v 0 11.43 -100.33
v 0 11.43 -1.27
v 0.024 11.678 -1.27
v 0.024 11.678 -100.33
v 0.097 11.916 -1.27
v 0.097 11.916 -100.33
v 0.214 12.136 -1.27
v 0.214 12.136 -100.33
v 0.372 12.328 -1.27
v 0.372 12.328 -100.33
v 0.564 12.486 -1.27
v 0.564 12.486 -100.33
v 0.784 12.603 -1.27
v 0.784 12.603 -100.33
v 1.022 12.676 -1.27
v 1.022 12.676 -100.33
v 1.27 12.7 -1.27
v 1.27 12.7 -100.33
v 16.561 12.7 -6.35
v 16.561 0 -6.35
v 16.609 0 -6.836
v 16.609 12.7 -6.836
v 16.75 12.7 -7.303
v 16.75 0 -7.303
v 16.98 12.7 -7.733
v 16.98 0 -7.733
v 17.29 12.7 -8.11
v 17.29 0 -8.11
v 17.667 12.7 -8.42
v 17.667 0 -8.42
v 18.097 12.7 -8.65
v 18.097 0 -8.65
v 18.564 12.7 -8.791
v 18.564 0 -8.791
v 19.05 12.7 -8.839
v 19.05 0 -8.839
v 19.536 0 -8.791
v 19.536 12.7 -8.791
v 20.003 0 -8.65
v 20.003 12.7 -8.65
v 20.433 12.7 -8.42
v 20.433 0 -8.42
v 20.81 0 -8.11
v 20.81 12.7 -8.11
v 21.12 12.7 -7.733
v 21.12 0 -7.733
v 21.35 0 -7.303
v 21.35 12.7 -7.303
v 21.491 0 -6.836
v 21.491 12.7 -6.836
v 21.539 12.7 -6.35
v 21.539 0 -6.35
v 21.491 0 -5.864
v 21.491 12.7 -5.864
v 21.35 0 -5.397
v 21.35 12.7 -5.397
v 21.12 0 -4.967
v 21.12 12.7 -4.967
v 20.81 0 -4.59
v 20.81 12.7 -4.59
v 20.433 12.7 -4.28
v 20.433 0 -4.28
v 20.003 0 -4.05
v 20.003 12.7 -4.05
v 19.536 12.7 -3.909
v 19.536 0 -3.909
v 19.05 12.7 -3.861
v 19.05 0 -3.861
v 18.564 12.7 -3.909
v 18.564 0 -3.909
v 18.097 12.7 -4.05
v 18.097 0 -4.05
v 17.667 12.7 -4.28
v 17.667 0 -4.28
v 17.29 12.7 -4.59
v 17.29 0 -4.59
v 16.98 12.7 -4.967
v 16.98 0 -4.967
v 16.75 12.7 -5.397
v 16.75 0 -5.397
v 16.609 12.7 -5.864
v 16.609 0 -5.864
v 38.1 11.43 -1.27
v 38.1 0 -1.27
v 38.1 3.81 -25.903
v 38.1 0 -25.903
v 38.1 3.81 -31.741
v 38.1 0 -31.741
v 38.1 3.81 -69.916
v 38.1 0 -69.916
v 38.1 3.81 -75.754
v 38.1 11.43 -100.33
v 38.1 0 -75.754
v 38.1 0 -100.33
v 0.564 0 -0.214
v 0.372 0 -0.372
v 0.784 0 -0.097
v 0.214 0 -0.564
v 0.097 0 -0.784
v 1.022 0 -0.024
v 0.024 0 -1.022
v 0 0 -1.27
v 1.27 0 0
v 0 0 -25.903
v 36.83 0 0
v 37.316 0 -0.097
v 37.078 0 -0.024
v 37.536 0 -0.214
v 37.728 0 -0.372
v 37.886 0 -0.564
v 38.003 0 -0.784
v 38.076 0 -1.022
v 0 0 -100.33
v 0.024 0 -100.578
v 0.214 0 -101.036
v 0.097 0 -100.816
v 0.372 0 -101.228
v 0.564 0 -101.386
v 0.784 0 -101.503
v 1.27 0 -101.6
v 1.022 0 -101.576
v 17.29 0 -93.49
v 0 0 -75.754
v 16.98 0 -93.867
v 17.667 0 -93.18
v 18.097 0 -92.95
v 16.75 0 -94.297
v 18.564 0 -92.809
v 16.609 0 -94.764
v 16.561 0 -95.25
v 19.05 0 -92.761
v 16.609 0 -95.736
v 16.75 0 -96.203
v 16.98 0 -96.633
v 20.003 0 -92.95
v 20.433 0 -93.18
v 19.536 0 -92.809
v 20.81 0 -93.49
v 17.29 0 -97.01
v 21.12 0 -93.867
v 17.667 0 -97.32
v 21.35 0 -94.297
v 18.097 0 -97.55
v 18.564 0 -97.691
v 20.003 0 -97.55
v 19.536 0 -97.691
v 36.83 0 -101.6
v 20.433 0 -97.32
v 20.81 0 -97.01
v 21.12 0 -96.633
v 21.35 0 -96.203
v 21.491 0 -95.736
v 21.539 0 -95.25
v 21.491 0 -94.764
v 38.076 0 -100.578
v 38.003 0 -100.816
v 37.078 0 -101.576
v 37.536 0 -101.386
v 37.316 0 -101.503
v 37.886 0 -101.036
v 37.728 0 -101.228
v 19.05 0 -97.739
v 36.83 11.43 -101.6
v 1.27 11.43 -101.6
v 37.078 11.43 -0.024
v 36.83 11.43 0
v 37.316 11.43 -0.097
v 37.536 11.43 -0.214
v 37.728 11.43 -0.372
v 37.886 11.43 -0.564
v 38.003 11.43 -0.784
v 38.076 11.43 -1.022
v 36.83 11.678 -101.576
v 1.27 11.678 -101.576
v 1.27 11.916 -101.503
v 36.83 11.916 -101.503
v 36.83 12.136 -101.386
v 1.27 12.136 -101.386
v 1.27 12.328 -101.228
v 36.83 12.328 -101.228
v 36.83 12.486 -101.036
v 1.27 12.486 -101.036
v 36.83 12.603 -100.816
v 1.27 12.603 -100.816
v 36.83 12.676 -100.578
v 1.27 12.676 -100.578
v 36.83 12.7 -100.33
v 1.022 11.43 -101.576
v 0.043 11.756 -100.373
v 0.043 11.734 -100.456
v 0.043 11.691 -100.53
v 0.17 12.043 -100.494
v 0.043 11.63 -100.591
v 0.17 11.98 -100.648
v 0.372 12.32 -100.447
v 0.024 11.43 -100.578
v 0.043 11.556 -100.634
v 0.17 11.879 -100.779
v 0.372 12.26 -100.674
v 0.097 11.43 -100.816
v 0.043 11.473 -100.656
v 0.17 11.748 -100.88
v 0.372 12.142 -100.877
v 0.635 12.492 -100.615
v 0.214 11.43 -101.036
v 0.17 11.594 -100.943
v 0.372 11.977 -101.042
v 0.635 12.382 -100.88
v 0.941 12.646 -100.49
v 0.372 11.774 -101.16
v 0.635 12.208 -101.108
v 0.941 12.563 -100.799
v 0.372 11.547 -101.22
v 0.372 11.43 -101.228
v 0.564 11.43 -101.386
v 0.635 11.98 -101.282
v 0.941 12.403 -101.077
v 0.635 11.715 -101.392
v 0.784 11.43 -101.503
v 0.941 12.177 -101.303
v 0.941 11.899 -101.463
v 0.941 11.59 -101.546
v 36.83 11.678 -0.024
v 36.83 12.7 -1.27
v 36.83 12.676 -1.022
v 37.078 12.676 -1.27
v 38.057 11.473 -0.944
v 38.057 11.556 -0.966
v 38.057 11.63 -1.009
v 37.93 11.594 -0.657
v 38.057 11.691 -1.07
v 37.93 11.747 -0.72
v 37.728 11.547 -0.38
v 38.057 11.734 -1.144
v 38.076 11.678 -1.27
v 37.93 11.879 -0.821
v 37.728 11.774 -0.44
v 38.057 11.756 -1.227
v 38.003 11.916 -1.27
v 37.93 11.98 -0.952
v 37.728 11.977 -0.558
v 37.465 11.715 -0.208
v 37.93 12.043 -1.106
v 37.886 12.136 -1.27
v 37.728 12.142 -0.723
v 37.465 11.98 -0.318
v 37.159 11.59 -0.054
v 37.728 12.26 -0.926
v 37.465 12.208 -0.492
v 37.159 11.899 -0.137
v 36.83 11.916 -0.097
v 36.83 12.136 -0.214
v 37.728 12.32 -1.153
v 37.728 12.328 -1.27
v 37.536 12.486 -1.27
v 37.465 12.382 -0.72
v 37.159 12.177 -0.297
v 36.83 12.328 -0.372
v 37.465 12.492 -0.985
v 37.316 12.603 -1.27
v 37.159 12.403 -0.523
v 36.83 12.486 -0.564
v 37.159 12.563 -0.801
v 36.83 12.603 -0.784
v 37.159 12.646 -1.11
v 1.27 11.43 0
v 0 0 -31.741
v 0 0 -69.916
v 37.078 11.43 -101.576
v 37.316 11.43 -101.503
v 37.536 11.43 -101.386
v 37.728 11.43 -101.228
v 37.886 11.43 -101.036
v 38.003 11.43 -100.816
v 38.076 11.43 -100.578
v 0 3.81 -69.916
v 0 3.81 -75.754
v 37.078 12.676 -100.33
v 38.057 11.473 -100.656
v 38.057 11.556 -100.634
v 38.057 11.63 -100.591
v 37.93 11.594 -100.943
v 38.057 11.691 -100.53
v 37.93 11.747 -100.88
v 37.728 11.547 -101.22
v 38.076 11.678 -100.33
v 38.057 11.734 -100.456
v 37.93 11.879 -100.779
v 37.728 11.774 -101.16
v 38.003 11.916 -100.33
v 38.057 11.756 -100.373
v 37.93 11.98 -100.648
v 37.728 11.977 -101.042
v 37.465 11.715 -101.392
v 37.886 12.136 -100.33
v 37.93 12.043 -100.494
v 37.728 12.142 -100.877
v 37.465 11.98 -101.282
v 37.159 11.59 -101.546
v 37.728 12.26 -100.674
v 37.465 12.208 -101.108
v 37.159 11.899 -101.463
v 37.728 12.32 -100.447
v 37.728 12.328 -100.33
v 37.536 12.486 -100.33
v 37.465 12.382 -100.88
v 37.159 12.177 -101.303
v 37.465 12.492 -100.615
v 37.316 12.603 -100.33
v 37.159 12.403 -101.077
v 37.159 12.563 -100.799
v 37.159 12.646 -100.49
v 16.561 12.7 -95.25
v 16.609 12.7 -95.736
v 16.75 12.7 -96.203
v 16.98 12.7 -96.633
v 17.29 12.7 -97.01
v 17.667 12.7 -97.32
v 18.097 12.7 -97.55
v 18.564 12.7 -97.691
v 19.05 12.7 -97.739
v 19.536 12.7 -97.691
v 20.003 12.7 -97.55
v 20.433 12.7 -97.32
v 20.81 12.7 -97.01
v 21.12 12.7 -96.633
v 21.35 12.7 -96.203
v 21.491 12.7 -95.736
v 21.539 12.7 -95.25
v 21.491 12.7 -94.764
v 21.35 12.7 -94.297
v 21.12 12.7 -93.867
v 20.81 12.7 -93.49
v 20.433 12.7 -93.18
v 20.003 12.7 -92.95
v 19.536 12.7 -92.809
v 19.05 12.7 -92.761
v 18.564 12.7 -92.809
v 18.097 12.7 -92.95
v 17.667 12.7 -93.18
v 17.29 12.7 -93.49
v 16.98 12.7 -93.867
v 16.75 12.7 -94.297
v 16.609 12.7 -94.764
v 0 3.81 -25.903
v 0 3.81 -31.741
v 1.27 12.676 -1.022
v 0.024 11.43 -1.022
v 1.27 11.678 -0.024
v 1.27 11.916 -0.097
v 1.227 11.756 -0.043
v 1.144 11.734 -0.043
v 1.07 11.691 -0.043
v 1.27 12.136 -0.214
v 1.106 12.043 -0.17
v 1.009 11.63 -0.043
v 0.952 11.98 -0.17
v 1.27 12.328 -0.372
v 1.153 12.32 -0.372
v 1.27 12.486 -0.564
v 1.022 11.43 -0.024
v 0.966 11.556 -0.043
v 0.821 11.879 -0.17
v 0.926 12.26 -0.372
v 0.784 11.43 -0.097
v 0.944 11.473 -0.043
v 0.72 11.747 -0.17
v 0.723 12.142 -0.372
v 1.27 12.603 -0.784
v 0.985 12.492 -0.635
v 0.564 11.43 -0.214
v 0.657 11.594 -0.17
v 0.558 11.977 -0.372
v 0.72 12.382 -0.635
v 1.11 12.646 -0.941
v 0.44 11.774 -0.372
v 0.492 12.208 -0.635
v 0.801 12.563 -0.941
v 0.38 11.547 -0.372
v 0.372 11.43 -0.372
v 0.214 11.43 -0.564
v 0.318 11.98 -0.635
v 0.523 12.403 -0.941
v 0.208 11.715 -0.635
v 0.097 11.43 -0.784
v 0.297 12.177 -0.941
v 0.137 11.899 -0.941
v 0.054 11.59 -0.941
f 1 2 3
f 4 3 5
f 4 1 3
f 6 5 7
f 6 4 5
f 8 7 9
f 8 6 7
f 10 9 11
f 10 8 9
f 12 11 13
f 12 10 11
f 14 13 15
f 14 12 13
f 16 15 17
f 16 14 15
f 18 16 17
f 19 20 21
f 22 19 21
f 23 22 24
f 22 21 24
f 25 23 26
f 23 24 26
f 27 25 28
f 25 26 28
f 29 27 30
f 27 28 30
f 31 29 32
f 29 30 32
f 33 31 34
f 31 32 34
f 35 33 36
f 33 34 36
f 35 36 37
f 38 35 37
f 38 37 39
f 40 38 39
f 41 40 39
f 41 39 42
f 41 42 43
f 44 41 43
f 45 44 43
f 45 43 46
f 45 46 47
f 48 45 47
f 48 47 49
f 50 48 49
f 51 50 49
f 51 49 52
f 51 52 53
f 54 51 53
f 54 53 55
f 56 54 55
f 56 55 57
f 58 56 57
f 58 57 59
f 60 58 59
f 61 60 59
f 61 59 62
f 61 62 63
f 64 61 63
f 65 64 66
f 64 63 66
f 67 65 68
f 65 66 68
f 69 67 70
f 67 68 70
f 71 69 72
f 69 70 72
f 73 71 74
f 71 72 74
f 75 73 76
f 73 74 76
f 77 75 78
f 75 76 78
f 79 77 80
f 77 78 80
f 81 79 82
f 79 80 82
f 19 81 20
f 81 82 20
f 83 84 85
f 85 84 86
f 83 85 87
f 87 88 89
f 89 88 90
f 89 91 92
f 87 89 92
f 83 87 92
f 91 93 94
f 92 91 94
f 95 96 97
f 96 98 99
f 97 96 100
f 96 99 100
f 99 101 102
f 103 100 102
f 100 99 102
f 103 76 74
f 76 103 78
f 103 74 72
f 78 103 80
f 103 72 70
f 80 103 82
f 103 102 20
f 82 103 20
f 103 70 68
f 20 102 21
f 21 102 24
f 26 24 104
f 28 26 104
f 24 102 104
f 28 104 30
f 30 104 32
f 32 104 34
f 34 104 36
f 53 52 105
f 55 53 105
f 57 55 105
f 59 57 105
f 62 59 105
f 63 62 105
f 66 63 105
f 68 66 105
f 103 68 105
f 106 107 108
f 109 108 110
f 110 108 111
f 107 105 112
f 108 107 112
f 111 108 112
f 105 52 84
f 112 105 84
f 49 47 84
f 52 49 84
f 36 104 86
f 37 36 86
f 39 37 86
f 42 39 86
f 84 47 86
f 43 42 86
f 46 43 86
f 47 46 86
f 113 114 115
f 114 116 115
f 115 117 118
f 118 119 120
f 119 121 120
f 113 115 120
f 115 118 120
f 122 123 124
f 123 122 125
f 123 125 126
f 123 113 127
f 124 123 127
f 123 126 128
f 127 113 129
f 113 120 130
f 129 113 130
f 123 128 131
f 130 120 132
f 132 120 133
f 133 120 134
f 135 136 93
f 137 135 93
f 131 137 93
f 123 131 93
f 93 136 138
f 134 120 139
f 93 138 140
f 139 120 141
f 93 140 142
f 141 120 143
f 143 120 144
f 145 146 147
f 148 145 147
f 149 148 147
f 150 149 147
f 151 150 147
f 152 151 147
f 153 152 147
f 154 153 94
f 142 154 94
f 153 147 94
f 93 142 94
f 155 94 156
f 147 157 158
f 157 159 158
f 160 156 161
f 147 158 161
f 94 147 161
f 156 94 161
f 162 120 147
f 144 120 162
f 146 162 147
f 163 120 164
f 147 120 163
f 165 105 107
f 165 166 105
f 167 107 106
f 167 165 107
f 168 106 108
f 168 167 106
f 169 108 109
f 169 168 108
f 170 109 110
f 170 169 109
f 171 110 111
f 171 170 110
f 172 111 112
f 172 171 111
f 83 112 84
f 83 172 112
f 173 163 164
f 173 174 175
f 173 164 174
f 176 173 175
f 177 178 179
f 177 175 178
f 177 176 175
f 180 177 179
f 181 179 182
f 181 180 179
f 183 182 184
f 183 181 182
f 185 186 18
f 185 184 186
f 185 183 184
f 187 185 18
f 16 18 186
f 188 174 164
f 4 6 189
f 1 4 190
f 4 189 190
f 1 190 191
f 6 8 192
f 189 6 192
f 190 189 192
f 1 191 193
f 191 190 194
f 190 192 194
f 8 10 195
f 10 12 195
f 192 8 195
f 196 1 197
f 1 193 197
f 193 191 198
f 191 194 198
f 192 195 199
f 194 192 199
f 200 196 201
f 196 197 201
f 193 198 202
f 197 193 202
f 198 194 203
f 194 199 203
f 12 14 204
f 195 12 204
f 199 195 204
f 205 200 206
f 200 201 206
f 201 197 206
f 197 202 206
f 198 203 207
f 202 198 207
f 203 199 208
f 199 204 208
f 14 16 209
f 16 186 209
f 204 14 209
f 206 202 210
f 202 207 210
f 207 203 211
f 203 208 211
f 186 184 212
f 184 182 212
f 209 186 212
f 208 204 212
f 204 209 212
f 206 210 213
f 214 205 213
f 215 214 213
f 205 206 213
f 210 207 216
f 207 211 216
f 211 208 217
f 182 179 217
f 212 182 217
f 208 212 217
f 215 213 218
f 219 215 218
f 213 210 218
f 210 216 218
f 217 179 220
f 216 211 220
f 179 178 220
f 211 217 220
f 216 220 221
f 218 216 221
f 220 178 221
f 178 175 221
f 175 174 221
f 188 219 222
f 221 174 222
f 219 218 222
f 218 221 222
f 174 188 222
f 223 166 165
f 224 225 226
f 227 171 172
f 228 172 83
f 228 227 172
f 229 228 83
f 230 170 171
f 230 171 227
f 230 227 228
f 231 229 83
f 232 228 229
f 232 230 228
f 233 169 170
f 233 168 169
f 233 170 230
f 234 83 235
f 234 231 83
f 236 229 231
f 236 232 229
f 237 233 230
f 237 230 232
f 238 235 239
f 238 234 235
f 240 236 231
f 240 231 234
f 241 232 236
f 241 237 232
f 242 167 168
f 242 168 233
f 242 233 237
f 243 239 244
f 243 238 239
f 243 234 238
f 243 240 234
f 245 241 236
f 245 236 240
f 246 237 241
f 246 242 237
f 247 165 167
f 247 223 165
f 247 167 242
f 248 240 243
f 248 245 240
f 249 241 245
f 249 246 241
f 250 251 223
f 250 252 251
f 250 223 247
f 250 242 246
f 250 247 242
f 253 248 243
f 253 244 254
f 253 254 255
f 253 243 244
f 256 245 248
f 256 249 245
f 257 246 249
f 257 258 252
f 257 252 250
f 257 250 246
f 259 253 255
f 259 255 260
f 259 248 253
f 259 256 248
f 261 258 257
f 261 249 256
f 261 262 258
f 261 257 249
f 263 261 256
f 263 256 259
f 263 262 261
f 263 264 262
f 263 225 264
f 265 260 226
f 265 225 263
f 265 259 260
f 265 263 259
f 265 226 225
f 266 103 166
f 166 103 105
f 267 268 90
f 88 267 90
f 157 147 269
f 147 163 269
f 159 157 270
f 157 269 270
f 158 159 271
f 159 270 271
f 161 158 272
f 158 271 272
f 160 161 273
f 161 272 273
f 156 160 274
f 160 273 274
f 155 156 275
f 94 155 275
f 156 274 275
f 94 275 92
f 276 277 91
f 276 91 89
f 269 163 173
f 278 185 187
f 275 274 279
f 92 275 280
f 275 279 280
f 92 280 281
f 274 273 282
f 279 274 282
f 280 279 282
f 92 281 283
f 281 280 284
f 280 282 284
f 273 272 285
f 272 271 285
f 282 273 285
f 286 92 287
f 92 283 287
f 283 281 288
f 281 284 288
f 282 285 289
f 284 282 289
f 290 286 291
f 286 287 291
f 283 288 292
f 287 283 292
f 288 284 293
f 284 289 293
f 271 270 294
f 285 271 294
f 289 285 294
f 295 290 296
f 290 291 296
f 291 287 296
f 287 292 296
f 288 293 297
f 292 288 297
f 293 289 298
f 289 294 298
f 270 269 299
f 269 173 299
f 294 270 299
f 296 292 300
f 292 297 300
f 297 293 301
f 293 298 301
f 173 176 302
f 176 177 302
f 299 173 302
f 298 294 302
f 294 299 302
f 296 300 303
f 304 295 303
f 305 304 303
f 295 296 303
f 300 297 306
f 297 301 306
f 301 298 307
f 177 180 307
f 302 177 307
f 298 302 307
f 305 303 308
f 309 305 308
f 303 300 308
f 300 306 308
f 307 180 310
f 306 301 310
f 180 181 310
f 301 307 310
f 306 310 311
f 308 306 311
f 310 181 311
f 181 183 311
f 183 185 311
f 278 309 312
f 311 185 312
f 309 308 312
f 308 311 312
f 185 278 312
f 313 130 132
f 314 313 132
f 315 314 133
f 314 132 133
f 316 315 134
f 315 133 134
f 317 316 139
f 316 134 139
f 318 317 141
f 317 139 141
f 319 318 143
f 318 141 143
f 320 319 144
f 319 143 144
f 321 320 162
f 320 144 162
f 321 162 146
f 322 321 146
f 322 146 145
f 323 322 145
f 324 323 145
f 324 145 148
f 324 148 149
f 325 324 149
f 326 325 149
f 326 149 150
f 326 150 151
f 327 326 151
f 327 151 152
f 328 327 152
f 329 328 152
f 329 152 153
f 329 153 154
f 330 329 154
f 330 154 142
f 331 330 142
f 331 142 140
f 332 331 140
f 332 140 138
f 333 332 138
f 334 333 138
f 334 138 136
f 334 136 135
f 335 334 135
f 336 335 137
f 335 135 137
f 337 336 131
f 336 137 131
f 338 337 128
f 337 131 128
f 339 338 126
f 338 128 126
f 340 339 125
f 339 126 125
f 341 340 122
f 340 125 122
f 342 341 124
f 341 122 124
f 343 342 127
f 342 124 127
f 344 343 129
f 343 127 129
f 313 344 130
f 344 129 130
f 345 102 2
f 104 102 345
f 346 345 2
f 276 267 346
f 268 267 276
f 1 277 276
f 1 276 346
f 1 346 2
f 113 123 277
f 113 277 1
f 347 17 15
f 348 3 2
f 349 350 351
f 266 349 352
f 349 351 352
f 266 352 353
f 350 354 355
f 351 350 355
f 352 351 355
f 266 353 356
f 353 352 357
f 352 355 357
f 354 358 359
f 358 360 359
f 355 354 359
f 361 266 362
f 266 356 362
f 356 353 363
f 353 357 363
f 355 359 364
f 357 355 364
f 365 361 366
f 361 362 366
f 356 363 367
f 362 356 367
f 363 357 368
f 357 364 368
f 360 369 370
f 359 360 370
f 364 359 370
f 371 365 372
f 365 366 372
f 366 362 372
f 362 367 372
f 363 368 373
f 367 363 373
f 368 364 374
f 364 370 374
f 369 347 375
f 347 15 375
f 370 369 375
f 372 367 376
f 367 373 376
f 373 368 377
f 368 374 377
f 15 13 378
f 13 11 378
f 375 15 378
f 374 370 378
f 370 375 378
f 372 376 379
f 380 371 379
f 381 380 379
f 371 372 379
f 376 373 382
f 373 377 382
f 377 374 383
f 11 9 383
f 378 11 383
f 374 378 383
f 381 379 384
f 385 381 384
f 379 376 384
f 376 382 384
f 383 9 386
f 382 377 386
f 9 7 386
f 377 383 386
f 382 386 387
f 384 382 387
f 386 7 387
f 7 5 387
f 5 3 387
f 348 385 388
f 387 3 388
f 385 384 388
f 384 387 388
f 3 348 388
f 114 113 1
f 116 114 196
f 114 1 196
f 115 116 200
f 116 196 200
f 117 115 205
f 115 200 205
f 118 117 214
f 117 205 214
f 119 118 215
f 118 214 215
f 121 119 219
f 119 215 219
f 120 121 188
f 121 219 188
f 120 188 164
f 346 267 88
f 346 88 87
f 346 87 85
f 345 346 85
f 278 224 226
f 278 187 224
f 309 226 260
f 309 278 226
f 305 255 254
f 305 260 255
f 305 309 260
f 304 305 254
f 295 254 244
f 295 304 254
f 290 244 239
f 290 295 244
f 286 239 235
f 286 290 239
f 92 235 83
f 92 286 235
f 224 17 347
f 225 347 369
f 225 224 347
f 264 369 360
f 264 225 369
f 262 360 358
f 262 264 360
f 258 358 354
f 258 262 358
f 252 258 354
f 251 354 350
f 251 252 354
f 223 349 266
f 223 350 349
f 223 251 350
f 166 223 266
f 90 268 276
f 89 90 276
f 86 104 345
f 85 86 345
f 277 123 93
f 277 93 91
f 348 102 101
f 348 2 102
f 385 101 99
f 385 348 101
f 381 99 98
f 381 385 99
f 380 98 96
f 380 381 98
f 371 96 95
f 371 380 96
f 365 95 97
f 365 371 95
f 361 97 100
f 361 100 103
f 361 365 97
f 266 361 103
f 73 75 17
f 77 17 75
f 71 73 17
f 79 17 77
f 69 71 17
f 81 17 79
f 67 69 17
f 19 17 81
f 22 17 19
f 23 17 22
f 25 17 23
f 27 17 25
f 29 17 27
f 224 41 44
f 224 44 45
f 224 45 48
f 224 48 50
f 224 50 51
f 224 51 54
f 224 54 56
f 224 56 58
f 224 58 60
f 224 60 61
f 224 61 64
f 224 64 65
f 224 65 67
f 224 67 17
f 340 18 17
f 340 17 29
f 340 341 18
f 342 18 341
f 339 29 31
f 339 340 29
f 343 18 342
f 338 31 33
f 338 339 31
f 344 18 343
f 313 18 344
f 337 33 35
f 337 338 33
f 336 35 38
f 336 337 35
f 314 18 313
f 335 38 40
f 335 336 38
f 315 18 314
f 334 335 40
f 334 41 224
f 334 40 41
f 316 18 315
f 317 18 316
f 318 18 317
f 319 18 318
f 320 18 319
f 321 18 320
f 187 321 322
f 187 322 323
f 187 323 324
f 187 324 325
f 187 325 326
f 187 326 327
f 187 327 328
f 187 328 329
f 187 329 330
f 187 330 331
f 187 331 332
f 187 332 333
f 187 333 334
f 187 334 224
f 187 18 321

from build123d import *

# Parameters (mm, degrees)
SKETCH1_W                    = 38.1
SKETCH1_H                    = 101.6
BOSS_EXTRUDE1_DEPTH          = 12.7
SKETCH12_W                   = 5.8382662
SKETCH12_H                   = 3.81
CUT_EXTRUDE1_DEPTH           = 110.249530891
FILLET2_R                    = 1.27
F_10_0_1935_DIAMETER_HOLE2_D = 4.9784


with BuildPart() as part:
    # Sketch1 → Boss-Extrude1 (new body)
    with BuildSketch(Plane(origin=(0, 0, 0), x_dir=(1, 0, 0), z_dir=(0, 1, 0))):
        with Locations((19.05, 50.8)):
            Rectangle(SKETCH1_W, SKETCH1_H)
    extrude(amount=BOSS_EXTRUDE1_DEPTH)

    # Sketch12 → Cut-Extrude1 (cut, through all)
    with BuildSketch(Plane.ZY):
        with Locations((-72.8347159, 1.905)):
            Rectangle(SKETCH12_W, SKETCH12_H)
        with Locations((-28.8219007, 1.905)):
            Rectangle(SKETCH12_W, SKETCH12_H)
    extrude(amount=-CUT_EXTRUDE1_DEPTH, mode=Mode.SUBTRACT)

    # Fillet2
    fillet2_edges = [part.edges().sort_by_distance(p)[0] for p in [
        (19.05, 12.7, -101.6),
        (0, 12.7, -50.8),
        (19.05, 12.7, 0),
        (0, 6.35, 0),
        (0, 6.35, -101.6),
        (38.1, 6.35, -101.6),
        (38.1, 6.35, 0),
        (38.1, 12.7, -50.8),
    ]]
    fillet(fillet2_edges, radius=FILLET2_R)

    # #10 (0.1935) Diameter Hole2 (through all)
    with Locations(Plane(origin=(0, 12.7, 0), x_dir=(1, 0, 0), z_dir=(0, 1, 0))):
        with Locations((19.05, 95.25), (19.05, 6.35)):
            Hole(F_10_0_1935_DIAMETER_HOLE2_D / 2)


solid = part.part
